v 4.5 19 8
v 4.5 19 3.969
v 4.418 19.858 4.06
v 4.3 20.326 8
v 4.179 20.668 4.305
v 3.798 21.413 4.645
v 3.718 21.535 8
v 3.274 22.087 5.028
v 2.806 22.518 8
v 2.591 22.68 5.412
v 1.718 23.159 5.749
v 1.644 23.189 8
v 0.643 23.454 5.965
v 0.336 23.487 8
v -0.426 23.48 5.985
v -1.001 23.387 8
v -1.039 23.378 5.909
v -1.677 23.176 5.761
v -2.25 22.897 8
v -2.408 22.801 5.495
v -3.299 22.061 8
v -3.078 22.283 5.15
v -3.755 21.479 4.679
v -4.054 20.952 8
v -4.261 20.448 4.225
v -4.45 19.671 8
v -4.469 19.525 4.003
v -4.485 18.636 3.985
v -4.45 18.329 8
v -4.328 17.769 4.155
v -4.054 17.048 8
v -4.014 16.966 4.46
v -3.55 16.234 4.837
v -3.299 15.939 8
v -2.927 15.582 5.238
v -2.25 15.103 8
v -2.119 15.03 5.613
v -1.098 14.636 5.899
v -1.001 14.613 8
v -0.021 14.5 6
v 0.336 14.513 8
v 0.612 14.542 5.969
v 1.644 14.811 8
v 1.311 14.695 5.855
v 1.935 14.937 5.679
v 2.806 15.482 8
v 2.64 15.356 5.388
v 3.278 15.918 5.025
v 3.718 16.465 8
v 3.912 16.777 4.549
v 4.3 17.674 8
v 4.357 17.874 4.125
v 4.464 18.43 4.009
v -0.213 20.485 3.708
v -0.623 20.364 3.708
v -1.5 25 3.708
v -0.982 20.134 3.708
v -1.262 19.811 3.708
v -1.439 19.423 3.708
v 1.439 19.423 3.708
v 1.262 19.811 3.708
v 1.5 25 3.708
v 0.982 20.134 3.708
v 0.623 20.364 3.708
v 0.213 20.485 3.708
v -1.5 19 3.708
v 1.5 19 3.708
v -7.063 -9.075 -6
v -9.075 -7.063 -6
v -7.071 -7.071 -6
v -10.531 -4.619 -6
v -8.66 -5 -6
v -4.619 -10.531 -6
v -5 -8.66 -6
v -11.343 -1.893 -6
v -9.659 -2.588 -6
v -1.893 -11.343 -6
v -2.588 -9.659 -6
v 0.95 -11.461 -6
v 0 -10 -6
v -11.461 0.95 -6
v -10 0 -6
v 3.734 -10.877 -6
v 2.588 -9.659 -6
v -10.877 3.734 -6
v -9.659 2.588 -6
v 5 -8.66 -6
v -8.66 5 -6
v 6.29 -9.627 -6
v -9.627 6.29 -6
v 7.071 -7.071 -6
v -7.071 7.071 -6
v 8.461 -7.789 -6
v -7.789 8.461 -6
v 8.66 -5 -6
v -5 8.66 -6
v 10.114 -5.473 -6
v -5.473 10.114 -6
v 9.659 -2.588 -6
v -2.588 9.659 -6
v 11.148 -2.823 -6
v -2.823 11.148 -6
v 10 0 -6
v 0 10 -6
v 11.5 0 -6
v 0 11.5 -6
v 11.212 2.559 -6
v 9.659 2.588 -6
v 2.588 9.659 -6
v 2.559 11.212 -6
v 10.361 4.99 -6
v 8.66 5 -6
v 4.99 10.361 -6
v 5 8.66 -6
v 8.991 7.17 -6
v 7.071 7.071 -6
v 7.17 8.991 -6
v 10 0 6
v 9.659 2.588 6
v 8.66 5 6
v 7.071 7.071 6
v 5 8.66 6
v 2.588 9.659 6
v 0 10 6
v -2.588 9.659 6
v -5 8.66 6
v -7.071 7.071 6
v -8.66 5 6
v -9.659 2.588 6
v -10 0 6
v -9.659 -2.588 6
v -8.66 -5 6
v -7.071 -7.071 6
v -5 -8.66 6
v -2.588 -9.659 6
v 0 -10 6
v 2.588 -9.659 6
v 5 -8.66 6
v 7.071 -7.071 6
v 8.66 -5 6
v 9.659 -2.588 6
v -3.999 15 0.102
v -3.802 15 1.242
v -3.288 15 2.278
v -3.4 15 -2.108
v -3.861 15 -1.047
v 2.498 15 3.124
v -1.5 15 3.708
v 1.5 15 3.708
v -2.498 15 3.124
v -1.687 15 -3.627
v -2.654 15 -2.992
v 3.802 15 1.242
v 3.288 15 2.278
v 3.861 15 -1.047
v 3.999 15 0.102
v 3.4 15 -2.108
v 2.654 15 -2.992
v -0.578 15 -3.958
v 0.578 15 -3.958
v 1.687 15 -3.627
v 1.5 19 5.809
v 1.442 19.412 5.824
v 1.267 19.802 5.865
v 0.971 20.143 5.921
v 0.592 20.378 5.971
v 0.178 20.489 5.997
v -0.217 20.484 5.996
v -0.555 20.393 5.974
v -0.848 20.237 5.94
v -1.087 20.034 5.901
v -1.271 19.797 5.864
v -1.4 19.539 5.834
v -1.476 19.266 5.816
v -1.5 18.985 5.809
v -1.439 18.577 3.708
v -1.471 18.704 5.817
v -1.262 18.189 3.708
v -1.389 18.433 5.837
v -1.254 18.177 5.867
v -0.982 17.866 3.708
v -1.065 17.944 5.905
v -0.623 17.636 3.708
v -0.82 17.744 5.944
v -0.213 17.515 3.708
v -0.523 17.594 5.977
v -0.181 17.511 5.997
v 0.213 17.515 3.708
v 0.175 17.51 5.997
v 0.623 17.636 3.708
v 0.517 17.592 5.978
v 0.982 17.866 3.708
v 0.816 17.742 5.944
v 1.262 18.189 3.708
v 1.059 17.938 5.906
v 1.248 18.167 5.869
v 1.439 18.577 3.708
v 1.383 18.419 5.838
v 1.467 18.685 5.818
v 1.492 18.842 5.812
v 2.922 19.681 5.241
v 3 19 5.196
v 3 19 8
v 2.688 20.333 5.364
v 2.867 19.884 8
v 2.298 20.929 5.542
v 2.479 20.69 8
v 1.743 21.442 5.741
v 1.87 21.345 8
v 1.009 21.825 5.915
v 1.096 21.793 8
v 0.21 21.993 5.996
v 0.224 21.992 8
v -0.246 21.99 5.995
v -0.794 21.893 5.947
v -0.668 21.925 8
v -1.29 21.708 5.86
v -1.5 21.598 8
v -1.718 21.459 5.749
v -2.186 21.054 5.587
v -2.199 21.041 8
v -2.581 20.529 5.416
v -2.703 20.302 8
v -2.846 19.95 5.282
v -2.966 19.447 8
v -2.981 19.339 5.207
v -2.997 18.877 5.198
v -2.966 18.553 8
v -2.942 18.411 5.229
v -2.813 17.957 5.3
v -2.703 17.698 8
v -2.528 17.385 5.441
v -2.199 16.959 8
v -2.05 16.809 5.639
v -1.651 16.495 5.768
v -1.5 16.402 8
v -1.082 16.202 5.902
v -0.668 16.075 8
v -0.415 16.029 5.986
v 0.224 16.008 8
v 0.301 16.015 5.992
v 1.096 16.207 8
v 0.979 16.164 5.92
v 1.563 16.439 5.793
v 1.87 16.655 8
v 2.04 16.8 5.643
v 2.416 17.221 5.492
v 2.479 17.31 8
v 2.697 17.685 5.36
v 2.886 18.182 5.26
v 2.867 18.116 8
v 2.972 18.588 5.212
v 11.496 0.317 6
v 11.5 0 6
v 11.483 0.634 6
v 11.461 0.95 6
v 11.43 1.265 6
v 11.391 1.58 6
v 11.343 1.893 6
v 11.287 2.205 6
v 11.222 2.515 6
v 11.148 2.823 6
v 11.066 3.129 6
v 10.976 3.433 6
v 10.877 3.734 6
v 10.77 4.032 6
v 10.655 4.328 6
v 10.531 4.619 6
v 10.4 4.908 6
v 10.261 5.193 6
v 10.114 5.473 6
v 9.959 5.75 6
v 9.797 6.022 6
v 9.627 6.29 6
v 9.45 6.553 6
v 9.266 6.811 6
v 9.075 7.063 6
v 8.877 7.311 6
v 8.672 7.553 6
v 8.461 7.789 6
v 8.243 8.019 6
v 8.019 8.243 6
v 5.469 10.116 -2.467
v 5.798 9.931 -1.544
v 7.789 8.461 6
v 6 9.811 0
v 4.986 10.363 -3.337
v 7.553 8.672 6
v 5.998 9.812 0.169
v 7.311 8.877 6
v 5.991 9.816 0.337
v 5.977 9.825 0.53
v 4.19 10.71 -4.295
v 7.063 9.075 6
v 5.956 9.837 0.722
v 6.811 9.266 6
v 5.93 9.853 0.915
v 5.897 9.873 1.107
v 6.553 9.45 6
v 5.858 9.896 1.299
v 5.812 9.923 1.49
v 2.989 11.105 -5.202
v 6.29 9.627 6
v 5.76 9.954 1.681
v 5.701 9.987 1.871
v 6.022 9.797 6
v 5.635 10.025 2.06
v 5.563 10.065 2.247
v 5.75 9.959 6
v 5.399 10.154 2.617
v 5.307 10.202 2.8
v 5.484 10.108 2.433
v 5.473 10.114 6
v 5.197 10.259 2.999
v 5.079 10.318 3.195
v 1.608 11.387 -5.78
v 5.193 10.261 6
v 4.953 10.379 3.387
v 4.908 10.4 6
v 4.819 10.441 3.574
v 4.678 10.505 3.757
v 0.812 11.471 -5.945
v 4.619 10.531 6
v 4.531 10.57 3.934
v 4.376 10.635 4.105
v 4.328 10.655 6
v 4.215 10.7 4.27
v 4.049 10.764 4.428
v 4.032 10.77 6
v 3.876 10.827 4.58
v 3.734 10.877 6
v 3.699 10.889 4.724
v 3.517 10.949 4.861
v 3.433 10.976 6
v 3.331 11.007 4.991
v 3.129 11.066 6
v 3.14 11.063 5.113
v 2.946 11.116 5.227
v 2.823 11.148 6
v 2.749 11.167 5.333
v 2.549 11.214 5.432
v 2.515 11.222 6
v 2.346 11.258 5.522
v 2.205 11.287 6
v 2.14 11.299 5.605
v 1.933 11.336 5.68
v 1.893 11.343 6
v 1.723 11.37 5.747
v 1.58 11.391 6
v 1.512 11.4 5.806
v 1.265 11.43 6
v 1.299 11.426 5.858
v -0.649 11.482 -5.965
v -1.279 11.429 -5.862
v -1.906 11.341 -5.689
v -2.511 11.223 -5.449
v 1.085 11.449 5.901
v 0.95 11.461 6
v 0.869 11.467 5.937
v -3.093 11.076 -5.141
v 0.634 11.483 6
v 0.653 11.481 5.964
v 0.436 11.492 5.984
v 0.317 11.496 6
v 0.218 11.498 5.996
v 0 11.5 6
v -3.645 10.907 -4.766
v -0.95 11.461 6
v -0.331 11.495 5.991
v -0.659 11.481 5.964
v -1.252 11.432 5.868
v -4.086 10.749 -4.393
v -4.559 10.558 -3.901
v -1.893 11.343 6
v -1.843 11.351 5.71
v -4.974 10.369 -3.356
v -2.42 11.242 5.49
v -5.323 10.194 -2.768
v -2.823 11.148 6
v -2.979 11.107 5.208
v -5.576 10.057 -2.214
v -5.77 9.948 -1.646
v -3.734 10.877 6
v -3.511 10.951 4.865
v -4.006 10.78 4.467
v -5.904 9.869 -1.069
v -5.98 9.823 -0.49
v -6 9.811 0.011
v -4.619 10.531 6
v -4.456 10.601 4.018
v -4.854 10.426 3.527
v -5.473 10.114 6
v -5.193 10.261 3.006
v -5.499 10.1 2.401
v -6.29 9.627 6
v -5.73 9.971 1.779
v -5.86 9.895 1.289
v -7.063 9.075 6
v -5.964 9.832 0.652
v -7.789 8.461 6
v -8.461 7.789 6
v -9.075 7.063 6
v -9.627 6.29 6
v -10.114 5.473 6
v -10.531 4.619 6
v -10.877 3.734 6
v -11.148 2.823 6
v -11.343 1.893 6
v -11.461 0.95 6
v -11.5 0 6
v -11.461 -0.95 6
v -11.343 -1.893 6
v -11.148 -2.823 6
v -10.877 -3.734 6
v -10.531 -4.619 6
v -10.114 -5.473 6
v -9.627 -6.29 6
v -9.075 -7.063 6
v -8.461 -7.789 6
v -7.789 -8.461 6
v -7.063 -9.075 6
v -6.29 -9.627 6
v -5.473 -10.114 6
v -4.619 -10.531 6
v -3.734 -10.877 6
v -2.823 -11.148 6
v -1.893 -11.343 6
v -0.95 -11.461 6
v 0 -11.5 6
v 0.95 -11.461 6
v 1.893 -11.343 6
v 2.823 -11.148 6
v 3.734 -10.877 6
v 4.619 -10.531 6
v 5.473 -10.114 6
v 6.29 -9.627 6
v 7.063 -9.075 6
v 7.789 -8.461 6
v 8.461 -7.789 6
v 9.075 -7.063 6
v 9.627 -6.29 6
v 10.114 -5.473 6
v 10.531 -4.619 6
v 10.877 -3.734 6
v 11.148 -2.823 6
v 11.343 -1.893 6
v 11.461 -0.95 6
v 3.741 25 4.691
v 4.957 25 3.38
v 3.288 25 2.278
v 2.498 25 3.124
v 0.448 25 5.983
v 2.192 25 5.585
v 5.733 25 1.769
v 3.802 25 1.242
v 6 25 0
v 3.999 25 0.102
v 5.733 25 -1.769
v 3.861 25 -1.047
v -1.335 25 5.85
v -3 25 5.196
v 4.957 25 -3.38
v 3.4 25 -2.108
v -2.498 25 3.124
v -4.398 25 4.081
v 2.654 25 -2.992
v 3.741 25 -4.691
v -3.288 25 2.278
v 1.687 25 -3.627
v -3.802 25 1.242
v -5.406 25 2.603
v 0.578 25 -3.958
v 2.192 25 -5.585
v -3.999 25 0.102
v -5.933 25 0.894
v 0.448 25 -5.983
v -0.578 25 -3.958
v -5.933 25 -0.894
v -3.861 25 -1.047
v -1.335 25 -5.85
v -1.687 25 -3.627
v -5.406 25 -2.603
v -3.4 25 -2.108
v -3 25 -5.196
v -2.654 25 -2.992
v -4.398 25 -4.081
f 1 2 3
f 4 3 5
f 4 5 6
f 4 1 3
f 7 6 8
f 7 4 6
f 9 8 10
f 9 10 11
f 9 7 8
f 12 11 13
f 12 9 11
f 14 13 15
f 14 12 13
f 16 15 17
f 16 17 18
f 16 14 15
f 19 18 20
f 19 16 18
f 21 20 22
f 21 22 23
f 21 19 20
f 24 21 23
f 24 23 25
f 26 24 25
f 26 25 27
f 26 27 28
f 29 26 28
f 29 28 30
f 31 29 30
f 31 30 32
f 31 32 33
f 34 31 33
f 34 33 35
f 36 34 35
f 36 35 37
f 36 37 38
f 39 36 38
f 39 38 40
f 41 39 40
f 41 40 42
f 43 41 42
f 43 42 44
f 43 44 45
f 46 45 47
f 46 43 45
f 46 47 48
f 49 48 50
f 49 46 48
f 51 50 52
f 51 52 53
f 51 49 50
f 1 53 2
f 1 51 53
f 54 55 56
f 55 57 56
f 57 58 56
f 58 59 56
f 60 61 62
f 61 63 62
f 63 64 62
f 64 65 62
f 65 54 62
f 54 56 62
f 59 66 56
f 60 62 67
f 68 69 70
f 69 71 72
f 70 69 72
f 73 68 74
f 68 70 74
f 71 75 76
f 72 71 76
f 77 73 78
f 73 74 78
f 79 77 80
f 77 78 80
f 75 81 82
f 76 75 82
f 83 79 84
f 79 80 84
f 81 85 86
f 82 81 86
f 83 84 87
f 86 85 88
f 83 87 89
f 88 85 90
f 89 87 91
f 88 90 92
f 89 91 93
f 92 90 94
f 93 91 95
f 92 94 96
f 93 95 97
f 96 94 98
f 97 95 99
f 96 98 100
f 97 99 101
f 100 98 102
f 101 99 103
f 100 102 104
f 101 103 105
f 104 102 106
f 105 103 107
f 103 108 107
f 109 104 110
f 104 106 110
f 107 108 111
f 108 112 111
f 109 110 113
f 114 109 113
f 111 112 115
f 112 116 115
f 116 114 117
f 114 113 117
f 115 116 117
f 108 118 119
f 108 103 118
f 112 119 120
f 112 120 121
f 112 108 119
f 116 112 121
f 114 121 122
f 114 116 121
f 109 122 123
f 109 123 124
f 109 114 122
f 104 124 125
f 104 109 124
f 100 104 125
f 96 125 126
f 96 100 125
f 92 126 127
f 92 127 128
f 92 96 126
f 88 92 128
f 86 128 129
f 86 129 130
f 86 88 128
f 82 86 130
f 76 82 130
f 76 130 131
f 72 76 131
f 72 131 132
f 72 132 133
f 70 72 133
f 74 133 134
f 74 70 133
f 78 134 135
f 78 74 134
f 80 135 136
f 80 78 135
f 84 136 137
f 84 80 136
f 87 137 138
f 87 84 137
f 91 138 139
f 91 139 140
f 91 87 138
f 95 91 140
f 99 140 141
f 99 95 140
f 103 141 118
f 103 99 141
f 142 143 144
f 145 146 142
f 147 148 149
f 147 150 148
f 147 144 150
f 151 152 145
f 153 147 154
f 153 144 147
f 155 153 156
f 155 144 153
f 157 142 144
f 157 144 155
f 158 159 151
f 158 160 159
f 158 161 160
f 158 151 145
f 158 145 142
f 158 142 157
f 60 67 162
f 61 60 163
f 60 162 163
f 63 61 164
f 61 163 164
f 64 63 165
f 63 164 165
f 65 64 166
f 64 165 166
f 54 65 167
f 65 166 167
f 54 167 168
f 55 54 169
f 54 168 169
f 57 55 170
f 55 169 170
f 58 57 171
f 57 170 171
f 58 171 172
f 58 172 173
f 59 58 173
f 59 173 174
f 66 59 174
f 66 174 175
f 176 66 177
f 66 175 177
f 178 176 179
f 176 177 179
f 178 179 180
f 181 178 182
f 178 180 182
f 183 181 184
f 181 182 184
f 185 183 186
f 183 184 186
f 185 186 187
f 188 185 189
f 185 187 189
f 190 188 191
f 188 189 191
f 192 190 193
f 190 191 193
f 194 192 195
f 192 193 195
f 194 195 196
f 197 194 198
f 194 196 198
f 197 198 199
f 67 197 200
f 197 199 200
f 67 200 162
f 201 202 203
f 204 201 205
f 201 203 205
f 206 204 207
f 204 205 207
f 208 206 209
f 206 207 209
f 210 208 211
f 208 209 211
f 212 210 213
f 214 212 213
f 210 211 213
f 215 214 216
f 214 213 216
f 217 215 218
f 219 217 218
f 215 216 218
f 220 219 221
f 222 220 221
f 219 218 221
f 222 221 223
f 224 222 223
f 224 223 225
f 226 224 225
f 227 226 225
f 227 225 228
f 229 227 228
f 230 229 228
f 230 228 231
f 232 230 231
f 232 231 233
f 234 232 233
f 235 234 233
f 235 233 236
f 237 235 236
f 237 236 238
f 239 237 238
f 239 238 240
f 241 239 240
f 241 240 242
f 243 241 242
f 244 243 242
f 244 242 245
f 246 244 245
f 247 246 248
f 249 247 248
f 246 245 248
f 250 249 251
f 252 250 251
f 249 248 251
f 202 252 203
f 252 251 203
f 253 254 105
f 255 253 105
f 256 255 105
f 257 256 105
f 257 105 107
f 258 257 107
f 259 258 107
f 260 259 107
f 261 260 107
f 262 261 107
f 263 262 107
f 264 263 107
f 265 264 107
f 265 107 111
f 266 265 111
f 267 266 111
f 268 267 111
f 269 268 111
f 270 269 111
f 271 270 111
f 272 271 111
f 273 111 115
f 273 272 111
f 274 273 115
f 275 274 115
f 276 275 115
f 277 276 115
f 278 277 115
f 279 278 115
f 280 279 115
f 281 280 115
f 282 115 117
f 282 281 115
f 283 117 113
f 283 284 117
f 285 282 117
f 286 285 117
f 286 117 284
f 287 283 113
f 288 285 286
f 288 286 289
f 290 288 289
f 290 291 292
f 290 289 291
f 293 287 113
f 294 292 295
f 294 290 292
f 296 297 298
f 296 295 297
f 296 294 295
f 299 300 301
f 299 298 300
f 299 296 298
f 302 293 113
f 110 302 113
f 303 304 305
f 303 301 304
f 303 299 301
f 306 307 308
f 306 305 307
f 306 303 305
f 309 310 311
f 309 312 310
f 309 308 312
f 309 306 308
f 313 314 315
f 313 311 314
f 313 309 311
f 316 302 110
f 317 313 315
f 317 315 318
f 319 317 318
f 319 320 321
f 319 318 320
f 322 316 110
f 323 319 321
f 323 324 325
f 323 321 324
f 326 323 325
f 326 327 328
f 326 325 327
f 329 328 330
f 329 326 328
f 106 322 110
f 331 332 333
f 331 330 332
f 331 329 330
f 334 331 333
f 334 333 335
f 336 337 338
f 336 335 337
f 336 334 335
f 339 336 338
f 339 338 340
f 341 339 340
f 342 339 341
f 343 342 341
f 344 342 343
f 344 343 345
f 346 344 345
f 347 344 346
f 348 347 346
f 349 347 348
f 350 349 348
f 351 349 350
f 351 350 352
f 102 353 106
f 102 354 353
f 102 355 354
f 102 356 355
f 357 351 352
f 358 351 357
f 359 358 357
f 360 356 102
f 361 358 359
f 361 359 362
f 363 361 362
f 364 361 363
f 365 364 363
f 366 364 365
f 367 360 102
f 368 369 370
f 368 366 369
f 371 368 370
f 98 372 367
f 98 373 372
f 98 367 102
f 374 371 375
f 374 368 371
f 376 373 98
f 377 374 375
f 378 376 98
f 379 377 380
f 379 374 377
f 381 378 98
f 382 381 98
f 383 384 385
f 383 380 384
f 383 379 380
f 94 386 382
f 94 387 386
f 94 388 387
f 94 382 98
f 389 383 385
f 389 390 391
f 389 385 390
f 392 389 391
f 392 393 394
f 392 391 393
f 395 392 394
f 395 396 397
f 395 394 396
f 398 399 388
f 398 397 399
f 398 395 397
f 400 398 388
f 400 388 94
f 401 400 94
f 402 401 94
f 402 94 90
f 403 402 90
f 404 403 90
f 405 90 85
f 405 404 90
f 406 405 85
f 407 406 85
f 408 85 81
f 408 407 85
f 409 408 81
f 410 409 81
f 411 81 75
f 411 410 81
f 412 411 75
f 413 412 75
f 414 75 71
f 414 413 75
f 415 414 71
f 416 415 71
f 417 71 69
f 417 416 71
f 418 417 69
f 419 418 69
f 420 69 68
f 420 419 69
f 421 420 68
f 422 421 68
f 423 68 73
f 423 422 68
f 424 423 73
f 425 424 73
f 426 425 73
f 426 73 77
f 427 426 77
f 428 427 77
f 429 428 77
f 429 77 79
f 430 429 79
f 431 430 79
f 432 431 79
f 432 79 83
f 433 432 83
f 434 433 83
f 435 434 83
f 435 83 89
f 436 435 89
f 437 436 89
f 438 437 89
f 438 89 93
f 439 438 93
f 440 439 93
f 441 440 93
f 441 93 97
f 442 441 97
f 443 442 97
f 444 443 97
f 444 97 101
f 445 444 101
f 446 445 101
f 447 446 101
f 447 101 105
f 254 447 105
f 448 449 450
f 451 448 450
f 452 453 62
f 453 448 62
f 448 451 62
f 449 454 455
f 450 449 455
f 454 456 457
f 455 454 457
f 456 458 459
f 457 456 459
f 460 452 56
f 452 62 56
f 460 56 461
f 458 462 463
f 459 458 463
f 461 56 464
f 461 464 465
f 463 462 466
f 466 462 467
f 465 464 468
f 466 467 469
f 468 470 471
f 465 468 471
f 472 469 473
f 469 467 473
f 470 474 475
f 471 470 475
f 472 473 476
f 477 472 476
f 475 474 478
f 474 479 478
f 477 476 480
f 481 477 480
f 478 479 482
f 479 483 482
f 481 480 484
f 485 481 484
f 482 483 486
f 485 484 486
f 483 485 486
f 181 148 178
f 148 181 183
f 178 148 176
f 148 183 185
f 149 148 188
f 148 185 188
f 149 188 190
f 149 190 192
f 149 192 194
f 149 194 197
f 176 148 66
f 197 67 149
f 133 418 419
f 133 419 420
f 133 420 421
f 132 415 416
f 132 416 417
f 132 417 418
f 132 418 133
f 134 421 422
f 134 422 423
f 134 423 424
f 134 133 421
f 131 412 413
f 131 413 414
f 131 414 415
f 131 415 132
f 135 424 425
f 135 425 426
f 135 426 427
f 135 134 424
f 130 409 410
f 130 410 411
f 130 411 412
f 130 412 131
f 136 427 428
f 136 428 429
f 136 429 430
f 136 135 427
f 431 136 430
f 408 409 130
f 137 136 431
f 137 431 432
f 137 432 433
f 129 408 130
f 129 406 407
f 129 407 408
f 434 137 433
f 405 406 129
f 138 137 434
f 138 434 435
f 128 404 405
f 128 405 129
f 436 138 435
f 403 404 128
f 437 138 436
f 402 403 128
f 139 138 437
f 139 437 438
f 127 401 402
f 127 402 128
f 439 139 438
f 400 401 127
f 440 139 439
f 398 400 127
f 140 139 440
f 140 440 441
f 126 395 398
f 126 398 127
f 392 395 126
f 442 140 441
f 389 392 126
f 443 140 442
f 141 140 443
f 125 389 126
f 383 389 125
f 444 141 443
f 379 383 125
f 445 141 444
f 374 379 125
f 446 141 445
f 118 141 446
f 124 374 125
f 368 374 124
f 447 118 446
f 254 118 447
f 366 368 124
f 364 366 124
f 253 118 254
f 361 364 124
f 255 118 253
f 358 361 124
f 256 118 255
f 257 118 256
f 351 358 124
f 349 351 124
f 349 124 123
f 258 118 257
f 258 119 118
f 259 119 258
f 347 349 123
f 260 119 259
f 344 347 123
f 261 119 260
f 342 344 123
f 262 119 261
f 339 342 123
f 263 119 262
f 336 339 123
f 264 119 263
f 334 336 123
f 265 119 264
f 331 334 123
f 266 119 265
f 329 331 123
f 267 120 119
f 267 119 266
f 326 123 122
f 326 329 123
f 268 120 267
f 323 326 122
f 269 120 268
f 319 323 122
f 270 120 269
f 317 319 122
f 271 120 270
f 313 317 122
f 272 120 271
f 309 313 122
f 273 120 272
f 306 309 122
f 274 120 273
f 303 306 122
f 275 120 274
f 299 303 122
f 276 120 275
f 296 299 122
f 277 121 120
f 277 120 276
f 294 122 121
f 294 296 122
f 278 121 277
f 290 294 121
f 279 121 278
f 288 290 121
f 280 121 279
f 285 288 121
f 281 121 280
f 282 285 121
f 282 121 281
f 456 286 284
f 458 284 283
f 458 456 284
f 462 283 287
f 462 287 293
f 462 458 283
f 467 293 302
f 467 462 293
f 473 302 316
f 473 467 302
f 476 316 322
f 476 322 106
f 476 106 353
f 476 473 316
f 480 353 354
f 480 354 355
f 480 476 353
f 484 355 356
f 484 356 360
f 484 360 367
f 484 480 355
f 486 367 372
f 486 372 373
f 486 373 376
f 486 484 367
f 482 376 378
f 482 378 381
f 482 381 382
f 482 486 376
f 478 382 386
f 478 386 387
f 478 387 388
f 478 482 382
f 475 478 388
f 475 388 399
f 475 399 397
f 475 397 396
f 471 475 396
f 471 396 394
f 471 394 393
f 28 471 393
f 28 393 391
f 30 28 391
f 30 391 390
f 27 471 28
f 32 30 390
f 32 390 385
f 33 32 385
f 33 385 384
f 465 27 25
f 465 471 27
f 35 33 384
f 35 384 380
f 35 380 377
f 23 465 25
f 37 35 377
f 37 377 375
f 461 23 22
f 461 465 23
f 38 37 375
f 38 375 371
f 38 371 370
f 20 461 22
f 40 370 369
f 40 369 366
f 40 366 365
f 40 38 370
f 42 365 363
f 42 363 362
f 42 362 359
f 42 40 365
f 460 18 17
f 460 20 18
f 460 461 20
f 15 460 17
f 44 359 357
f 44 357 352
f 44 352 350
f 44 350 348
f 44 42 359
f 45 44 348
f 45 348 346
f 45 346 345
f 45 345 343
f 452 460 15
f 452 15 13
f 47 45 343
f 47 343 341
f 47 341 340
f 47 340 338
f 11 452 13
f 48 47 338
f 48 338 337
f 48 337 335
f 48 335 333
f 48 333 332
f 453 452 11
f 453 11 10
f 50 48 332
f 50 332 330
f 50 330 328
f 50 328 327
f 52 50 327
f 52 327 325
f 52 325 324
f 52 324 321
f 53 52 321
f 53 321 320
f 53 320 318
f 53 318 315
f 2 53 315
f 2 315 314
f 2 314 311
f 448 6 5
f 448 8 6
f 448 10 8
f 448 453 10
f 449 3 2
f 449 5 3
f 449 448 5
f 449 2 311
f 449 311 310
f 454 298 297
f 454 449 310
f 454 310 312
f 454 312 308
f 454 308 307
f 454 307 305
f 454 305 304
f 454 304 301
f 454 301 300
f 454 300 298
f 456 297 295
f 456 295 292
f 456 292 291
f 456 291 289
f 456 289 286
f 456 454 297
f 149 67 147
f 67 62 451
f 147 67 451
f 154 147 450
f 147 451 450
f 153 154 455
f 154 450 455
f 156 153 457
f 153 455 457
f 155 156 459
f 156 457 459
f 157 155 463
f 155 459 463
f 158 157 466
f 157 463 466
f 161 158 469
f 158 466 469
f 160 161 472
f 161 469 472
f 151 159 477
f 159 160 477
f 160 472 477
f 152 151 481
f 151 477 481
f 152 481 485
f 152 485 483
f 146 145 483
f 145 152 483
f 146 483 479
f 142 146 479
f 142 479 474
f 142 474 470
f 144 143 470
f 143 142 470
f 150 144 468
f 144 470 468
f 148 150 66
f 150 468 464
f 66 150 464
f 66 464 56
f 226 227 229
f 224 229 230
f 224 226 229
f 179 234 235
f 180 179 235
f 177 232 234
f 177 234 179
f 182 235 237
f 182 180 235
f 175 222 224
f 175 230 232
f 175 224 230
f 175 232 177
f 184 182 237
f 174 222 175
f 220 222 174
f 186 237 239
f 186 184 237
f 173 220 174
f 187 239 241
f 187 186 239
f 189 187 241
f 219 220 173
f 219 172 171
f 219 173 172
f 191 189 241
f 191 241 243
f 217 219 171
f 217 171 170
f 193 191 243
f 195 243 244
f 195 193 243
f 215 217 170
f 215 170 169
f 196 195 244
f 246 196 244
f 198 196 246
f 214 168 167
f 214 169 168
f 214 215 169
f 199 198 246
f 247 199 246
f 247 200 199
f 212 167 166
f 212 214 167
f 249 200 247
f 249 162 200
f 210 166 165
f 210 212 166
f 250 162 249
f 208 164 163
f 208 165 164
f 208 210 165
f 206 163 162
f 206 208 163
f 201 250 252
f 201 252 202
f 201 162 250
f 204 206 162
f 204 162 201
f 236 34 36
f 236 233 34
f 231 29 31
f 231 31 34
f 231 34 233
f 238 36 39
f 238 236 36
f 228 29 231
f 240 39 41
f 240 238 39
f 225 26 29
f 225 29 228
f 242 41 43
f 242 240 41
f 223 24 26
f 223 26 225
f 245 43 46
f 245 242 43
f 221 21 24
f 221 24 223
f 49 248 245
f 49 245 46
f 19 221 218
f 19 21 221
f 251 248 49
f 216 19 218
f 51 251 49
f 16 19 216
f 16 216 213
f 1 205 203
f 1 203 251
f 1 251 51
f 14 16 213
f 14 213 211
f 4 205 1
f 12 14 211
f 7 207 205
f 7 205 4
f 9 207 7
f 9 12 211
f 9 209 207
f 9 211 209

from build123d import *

# Parameters (mm, degrees)
SKETCH1_R               = 11.5
SKETCH1_R_2             = 10
BOSS_EXTRUDE1_DEPTH     = 6
SKETCH2_R               = 6
BOSS_EXTRUDE3_DEPTH     = 18
SKETCH4_R               = 10
CUT_EXTRUDE2_DEPTH      = 7.000000123
CUT_EXTRUDE2_DEPTH_BACK = 7.000000101
SKETCH5_R               = 4
CUT_EXTRUDE3_DEPTH      = 10
SKETCH6_R               = 4.5
SKETCH6_R_2             = 3
BOSS_EXTRUDE4_DEPTH     = 5
SKETCH7_R               = 4
CUT_EXTRUDE4_DEPTH      = 10
BOSS_EXTRUDE5_DEPTH     = 21
SKETCH9_R               = 10
CUT_EXTRUDE5_DEPTH      = 1.0000001
CUT_EXTRUDE5_DEPTH_BACK = 15.0000001
SKETCH10_R              = 1.5
CUT_EXTRUDE6_DEPTH      = 8


with BuildPart() as part:
    # Sketch1 → Boss-Extrude1 (new body, symmetric)
    with BuildSketch(Plane.XY):
        Circle(SKETCH1_R)
        Circle(SKETCH1_R_2, mode=Mode.SUBTRACT)
    extrude(amount=BOSS_EXTRUDE1_DEPTH, both=True)

    # Sketch2 → Boss-Extrude3 (add)
    with BuildSketch(Plane(origin=(0, 25, 0), x_dir=(1, 0, 0), z_dir=(0, 1, 0))):
        Circle(SKETCH2_R)
    extrude(amount=-BOSS_EXTRUDE3_DEPTH)

    # Sketch4 → Cut-Extrude2 (cut, two sides)
    with BuildSketch(Plane.XY) as cut_extrude2_sk:
        Circle(SKETCH4_R)
    extrude(amount=CUT_EXTRUDE2_DEPTH, mode=Mode.SUBTRACT)
    extrude(cut_extrude2_sk.sketch, amount=-CUT_EXTRUDE2_DEPTH_BACK, mode=Mode.SUBTRACT)

    # Sketch5 → Cut-Extrude3 (cut)
    with BuildSketch(Plane(origin=(0, 25, 0), x_dir=(1, 0, 0), z_dir=(0, 1, 0))):
        Circle(SKETCH5_R)
    extrude(amount=-CUT_EXTRUDE3_DEPTH, mode=Mode.SUBTRACT)

    # Sketch6 → Boss-Extrude4 (add)
    with BuildSketch(Plane.XY.offset(8)):
        with Locations((0, 19)):
            Circle(SKETCH6_R)
        with Locations((0, 19)):
            Circle(SKETCH6_R_2, mode=Mode.SUBTRACT)
    extrude(amount=-BOSS_EXTRUDE4_DEPTH)

    # Sketch7 → Cut-Extrude4 (cut)
    with BuildSketch(Plane(origin=(0, 25, 0), x_dir=(1, 0, 0), z_dir=(0, 1, 0))):
        Circle(SKETCH7_R)
    extrude(amount=-CUT_EXTRUDE4_DEPTH, mode=Mode.SUBTRACT)

    # Sketch8 → Boss-Extrude5 (add)
    with BuildSketch(Plane(origin=(0, 25, 0), x_dir=(1, 0, 0), z_dir=(0, 1, 0))):
        with BuildLine():
            Line((-1.5, -3.708099244), (1.5, -3.708099244))
            ThreePointArc((1.5, -3.708099244), (0, -4), (-1.5, -3.708099244))
        make_face()
    extrude(amount=-BOSS_EXTRUDE5_DEPTH)

    # Sketch9 → Cut-Extrude5 (cut, two sides)
    with BuildSketch(Plane.XY.offset(8)) as cut_extrude5_sk:
        Circle(SKETCH9_R)
    extrude(amount=CUT_EXTRUDE5_DEPTH, mode=Mode.SUBTRACT)
    extrude(cut_extrude5_sk.sketch, amount=-CUT_EXTRUDE5_DEPTH_BACK, mode=Mode.SUBTRACT)

    # Sketch10 → Cut-Extrude6 (cut)
    with BuildSketch(Plane.XY.offset(8)):
        with Locations((0, 19)):
            Circle(SKETCH10_R)
    extrude(amount=-CUT_EXTRUDE6_DEPTH, mode=Mode.SUBTRACT)


solid = part.part
